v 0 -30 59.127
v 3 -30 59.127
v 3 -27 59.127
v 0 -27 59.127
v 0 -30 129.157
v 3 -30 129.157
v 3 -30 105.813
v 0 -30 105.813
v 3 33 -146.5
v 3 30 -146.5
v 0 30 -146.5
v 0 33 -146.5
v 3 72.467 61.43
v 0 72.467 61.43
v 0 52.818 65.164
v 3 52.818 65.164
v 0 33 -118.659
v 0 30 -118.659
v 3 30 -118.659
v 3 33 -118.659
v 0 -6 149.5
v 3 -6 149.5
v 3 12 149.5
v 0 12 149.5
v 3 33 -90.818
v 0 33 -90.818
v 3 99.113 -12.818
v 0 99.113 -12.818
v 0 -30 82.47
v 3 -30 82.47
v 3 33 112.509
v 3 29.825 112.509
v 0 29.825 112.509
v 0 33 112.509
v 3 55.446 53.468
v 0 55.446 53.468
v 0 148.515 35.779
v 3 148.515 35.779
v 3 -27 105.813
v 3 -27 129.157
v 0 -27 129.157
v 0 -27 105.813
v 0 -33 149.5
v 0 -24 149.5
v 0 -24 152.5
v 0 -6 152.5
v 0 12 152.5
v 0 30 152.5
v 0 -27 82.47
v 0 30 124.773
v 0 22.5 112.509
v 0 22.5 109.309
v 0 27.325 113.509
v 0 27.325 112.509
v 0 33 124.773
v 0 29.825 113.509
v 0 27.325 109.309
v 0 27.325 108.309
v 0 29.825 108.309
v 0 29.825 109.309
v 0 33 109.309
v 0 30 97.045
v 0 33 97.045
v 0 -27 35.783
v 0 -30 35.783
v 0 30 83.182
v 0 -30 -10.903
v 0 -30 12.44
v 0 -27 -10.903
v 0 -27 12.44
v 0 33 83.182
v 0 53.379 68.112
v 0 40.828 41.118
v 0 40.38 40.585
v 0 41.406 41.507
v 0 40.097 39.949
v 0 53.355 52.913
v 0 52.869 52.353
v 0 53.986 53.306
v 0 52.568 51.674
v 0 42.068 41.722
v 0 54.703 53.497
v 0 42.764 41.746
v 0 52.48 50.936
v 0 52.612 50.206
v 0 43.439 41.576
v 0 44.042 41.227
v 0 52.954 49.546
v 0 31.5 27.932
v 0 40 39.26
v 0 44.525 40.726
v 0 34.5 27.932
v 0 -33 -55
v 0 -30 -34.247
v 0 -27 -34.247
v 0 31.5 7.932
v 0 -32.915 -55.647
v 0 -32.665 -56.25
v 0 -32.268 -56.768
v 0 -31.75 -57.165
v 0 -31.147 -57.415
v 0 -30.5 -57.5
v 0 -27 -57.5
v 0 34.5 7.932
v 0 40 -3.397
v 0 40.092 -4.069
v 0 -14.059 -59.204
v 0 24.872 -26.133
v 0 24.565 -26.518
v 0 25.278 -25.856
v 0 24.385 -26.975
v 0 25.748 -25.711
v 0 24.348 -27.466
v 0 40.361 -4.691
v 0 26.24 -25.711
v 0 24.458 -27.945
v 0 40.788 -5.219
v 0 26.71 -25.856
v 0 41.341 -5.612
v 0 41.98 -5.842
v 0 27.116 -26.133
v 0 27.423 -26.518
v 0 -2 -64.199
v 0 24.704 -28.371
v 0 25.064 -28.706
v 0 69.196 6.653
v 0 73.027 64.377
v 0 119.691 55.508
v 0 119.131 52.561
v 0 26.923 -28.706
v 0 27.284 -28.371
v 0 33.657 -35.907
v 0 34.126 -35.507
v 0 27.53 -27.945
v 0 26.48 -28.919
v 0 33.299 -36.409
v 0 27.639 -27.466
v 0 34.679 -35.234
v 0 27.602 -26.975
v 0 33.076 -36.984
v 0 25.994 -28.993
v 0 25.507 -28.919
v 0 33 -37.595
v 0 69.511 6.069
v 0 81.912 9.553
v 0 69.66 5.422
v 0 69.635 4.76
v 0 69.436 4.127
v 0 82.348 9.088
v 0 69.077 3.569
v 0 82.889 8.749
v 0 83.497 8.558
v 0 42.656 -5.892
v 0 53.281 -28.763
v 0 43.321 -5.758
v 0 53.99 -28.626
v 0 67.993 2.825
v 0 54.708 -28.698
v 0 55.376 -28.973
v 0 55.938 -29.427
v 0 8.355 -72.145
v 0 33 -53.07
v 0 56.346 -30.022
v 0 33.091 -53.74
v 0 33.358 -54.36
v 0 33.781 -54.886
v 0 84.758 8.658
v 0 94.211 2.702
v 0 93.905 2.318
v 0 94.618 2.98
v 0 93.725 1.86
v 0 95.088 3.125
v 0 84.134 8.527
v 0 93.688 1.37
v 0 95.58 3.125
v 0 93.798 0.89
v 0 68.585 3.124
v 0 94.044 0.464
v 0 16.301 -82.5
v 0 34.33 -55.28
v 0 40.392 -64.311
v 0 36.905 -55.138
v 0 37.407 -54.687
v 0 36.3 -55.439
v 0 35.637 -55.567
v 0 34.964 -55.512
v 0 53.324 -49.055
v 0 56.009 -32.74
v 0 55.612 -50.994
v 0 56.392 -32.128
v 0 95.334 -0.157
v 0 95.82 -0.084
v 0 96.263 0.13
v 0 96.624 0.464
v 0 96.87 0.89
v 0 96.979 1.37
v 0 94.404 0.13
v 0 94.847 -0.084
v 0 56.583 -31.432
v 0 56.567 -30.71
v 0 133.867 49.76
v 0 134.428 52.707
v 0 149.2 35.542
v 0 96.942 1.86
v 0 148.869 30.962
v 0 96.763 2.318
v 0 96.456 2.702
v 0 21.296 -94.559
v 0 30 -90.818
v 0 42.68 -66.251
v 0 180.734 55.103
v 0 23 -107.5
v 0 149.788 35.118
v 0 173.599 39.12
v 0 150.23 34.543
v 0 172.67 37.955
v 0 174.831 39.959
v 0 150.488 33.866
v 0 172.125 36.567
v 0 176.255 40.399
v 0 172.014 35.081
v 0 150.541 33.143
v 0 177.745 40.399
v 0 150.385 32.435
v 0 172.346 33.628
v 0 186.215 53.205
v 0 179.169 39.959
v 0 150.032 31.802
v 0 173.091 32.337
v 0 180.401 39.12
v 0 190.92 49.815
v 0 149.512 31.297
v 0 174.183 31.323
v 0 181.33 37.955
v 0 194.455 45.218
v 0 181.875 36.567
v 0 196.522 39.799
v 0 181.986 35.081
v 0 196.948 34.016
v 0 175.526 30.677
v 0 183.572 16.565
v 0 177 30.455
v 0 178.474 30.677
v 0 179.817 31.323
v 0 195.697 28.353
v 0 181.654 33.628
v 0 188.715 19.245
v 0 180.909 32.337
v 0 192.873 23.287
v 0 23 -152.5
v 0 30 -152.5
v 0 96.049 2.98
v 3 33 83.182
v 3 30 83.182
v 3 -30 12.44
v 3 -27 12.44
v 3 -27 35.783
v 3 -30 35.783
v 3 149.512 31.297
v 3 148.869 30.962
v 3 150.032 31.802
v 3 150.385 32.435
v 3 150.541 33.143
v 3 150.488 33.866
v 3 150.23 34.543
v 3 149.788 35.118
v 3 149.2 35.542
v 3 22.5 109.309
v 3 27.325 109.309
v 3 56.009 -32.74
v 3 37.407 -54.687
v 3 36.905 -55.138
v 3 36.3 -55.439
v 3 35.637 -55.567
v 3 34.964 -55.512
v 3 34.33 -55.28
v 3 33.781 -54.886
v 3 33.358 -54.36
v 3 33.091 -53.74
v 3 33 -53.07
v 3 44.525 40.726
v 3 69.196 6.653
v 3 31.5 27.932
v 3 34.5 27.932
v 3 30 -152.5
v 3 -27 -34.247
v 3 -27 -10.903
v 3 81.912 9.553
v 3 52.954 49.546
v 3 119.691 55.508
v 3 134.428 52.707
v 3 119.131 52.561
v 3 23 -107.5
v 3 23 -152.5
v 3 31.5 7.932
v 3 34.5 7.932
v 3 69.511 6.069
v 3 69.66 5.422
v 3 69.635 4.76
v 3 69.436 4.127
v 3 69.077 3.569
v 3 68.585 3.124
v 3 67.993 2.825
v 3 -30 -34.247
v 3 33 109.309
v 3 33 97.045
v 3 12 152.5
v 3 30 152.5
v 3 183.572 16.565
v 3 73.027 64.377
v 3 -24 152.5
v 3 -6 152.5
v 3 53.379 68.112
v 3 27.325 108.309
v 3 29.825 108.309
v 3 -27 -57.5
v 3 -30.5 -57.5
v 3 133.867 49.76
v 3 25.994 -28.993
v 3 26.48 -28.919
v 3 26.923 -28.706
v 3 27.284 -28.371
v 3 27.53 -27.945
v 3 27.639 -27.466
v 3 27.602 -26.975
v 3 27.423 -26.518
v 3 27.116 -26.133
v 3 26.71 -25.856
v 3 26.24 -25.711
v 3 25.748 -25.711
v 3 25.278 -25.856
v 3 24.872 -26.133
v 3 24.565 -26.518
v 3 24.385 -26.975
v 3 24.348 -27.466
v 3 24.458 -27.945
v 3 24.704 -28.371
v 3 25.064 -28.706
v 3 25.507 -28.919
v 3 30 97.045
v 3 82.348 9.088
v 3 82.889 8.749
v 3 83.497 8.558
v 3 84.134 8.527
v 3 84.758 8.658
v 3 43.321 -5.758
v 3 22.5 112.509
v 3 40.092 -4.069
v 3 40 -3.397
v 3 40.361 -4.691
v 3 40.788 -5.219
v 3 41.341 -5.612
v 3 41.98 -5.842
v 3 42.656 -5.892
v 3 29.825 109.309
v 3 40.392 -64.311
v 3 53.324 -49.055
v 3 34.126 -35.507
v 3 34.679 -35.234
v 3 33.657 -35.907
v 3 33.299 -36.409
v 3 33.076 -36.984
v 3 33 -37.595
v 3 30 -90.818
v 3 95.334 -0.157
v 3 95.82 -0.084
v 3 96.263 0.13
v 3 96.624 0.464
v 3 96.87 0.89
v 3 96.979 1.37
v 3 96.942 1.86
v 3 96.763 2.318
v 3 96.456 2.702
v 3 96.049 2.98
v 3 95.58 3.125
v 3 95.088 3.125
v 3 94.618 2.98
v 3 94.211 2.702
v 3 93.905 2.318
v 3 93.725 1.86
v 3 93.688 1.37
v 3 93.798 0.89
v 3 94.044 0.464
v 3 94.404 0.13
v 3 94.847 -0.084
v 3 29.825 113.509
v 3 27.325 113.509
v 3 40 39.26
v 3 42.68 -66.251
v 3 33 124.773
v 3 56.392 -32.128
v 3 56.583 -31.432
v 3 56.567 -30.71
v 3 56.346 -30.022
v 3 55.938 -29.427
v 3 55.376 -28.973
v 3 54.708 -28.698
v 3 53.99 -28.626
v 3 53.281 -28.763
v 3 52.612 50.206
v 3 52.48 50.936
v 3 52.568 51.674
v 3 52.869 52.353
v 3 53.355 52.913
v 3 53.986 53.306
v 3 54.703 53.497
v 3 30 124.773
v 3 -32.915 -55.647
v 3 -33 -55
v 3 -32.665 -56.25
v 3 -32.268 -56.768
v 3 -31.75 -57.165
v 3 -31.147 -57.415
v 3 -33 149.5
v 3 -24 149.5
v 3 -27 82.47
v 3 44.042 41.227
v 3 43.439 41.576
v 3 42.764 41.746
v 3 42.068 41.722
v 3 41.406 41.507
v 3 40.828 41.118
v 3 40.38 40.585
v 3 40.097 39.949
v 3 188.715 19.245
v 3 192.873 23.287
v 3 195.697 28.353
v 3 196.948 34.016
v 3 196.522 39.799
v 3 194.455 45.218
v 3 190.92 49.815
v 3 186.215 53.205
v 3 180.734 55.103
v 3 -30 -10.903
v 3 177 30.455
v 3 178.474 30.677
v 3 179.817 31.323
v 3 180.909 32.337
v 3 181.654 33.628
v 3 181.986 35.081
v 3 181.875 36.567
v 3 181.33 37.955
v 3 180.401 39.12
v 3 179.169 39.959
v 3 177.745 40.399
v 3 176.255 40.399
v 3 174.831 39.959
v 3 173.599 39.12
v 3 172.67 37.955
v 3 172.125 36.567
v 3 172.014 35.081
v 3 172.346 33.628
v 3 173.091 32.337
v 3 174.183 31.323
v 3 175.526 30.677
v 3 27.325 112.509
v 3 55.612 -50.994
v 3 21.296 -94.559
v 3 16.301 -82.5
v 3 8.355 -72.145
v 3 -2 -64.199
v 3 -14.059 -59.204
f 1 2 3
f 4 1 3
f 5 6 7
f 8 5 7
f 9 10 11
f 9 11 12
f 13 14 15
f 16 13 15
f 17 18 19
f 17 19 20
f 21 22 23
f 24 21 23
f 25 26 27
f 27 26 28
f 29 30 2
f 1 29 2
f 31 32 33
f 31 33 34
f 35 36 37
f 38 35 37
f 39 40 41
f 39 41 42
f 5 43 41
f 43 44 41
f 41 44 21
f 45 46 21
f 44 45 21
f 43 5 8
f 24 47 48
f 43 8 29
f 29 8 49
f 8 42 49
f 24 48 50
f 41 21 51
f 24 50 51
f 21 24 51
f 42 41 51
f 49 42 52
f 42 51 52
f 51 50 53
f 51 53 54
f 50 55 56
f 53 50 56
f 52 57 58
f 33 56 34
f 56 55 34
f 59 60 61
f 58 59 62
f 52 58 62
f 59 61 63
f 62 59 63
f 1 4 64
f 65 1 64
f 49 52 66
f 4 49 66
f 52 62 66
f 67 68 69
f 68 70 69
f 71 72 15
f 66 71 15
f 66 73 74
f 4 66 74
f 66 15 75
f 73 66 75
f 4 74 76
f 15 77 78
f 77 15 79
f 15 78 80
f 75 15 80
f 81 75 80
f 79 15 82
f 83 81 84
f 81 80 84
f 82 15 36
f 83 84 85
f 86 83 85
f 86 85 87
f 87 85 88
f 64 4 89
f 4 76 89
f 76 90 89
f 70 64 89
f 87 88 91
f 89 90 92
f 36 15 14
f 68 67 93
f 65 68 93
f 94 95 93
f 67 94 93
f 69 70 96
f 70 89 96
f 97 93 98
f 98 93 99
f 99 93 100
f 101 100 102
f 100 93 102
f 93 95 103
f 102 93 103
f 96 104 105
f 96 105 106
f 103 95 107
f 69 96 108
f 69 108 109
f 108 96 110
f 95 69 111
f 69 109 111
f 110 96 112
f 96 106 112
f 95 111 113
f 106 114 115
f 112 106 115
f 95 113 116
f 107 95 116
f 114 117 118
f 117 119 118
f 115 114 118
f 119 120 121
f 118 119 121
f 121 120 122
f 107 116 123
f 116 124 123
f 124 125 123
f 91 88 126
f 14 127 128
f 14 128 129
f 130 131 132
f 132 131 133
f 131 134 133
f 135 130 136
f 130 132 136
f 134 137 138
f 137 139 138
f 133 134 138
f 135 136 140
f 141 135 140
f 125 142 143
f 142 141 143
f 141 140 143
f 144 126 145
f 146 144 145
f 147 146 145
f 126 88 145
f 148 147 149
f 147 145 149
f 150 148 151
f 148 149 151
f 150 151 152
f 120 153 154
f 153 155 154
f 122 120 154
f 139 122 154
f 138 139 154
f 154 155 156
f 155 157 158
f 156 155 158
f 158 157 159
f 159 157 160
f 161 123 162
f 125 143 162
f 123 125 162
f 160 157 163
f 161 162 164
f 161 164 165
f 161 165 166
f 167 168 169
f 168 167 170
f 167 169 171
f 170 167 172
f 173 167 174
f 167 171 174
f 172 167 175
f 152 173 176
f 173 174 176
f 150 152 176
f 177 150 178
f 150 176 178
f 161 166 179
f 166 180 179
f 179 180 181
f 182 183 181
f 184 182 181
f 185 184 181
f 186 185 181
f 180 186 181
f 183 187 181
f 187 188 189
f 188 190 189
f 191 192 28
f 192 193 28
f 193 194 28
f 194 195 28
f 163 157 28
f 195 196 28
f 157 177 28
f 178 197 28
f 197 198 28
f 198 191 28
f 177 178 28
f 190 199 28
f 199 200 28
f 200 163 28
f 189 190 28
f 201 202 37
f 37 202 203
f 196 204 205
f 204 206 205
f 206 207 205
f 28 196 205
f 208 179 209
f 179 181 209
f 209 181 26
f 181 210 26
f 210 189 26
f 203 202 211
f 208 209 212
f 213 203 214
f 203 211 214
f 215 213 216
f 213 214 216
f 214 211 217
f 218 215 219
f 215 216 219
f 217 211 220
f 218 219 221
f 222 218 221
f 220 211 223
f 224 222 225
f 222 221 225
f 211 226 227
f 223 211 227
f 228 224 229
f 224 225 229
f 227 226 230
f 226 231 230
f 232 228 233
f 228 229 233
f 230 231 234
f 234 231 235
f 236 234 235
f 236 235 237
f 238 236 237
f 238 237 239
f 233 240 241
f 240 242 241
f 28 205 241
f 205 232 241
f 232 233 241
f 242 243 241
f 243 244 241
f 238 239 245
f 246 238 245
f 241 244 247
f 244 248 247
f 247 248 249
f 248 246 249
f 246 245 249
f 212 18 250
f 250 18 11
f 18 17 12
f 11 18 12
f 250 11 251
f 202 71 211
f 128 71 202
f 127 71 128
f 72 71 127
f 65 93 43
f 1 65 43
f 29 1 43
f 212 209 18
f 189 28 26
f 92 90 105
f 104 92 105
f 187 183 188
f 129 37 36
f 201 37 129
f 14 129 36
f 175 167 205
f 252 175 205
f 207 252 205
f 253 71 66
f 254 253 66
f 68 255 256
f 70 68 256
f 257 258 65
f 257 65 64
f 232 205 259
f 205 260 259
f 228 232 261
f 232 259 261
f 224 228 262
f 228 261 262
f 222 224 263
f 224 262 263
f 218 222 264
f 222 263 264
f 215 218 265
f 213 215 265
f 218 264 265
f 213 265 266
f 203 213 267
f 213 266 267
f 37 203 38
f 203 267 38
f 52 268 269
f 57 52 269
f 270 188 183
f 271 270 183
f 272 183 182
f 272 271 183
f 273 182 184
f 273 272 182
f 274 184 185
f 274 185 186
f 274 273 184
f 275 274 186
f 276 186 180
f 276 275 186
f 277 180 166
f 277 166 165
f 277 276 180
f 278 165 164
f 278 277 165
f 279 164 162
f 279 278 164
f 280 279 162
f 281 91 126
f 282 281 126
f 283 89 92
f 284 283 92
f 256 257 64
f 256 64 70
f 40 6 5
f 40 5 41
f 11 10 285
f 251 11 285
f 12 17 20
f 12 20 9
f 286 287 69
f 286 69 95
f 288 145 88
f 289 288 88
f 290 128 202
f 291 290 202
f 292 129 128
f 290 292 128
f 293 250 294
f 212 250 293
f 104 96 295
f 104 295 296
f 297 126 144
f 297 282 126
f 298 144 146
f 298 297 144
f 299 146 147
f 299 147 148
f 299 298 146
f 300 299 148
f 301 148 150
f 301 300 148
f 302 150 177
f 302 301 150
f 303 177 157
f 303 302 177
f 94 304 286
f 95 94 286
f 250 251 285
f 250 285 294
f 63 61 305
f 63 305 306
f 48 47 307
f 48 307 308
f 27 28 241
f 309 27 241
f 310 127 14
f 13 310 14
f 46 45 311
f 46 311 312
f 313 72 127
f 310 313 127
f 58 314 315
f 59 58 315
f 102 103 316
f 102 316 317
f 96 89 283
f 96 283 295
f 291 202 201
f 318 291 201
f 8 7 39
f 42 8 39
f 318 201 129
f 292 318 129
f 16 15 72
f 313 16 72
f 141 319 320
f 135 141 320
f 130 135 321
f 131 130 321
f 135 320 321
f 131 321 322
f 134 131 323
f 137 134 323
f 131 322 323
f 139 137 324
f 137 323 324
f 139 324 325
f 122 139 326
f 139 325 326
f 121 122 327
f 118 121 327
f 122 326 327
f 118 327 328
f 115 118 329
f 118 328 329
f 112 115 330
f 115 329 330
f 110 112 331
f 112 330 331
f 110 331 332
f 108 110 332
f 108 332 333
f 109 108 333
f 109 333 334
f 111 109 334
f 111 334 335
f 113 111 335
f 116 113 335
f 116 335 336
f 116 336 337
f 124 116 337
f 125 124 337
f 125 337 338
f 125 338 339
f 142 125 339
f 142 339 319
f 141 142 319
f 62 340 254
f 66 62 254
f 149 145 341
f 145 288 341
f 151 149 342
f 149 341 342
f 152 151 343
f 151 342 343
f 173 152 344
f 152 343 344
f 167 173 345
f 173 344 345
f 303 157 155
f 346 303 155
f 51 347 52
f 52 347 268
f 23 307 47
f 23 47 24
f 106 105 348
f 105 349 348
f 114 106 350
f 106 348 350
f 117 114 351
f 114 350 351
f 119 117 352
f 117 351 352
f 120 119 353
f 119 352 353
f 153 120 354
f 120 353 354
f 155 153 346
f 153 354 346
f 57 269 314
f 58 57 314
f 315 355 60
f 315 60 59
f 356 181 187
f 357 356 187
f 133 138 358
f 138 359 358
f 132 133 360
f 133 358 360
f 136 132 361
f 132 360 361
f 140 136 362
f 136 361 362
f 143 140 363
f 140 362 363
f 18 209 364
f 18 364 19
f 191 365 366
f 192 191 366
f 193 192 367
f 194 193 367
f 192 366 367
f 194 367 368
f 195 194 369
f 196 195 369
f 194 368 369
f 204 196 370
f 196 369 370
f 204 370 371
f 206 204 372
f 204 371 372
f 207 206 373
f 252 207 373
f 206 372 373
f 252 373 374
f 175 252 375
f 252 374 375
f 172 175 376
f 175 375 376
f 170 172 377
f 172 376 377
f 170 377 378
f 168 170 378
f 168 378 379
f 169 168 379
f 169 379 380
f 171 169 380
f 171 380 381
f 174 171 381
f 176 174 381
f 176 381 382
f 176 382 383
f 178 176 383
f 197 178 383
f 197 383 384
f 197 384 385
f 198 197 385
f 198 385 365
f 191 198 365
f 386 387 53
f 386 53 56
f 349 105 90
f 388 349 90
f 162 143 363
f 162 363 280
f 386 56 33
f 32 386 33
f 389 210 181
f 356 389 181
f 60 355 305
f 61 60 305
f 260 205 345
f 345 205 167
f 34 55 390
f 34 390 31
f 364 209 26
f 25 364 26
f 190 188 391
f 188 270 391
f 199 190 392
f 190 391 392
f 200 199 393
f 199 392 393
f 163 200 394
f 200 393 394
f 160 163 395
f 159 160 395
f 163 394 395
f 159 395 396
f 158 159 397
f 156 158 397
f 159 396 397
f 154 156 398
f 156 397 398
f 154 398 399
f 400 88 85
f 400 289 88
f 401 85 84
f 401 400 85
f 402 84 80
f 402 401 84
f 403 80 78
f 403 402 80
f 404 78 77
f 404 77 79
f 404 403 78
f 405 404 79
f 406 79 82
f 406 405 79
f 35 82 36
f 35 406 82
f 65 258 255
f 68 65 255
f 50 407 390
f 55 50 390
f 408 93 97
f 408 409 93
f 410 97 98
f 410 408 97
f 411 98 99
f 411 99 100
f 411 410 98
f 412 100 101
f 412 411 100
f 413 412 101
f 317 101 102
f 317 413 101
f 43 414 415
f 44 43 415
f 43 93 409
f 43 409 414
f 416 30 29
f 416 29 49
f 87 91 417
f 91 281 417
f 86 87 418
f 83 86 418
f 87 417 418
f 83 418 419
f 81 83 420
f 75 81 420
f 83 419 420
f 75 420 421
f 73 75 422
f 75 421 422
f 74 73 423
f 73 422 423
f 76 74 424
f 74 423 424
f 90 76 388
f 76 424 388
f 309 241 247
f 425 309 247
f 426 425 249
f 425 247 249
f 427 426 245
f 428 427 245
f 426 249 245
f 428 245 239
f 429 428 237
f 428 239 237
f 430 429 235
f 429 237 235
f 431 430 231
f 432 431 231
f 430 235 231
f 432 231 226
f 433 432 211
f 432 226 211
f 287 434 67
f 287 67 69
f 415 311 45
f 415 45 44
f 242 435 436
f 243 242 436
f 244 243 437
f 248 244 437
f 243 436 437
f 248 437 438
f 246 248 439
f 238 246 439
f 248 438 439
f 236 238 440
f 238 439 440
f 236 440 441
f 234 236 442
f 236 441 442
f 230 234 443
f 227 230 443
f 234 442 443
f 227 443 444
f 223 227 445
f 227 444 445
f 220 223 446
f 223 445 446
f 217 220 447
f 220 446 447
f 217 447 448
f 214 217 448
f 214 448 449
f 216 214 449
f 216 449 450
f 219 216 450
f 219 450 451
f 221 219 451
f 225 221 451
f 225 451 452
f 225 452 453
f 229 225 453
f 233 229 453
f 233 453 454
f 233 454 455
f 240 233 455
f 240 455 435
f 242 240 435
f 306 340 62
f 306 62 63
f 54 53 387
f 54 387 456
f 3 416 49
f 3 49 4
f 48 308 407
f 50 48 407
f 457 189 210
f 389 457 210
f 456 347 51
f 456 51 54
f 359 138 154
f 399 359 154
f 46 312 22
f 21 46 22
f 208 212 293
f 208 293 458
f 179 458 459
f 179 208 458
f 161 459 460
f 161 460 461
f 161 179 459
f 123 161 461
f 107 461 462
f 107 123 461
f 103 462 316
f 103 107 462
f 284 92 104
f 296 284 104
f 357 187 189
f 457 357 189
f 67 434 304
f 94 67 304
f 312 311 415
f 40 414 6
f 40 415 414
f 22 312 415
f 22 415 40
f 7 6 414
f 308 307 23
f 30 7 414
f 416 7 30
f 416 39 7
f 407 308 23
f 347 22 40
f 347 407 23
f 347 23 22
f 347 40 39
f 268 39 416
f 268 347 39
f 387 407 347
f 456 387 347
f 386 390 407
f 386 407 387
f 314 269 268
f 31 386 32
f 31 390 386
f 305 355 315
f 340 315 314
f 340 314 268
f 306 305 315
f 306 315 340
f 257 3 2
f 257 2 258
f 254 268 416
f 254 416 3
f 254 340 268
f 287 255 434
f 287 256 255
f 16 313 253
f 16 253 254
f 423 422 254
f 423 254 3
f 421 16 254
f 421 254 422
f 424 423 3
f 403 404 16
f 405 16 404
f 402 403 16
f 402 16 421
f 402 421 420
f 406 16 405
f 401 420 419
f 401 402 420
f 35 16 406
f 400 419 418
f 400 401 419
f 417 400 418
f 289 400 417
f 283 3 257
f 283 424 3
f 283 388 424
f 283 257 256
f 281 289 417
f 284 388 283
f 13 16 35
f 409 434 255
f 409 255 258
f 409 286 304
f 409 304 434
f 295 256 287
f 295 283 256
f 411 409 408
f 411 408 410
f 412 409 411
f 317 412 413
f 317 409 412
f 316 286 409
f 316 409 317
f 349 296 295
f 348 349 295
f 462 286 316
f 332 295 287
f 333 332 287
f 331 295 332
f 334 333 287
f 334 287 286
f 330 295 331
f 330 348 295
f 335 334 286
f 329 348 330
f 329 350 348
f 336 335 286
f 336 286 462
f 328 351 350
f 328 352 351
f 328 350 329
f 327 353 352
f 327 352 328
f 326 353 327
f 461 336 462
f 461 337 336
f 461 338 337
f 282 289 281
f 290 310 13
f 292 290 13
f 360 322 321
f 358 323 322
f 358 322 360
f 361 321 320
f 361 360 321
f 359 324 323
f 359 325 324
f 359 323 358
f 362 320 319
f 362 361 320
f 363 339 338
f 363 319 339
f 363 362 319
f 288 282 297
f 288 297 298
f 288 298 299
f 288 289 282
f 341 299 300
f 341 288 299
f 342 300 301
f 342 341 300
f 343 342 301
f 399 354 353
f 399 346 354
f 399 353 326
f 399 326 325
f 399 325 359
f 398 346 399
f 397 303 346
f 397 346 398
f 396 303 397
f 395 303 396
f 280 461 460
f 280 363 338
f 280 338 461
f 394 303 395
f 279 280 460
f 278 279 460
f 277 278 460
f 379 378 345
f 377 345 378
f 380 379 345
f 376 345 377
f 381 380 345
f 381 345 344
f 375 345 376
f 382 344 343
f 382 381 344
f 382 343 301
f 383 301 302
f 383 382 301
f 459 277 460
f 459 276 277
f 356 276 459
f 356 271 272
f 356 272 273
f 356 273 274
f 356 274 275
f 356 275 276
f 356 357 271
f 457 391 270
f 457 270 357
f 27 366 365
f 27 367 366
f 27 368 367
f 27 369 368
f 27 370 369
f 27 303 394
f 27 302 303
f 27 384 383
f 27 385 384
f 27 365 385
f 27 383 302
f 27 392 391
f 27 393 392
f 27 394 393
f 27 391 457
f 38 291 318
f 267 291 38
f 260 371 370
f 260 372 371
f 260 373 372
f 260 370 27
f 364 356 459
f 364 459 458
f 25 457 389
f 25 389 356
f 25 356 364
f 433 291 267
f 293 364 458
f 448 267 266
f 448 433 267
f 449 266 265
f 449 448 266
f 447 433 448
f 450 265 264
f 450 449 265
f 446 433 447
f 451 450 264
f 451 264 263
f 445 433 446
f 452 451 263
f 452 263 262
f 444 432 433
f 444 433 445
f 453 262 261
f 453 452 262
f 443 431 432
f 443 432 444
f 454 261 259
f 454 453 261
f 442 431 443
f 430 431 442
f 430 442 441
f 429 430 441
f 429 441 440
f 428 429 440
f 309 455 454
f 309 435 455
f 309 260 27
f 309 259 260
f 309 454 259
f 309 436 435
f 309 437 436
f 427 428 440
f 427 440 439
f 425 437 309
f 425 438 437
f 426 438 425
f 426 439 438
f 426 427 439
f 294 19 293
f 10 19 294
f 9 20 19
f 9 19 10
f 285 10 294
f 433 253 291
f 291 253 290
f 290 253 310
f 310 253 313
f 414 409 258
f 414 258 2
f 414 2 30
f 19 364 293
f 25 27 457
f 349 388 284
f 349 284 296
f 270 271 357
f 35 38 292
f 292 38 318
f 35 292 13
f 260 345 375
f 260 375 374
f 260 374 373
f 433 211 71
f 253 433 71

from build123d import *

# Parameters (mm, degrees)
BOSS_EXTRUDE1_DEPTH     = 3
SKETCH2_W               = 27.727272727
SKETCH2_H               = 3
SKETCH2_W_2             = 3
SKETCH2_H_2             = 18
SKETCH2_H_3             = 9
SKETCH2_W_3             = 23.343342349
SKETCH2_W_4             = 23.34334235
SKETCH2_W_5             = 6
CUT_EXTRUDE1_DEPTH      = 1
CUT_EXTRUDE1_DEPTH_BACK = 4
SKETCH3_W               = 3.2
SKETCH3_H               = 10.5
SKETCH3_W_2             = 5.2
SKETCH3_H_2             = 2.5
CUT_EXTRUDE2_DEPTH      = 1
CUT_EXTRUDE2_DEPTH_BACK = 4
FILLET1_R               = 2.5
BOSS_EXTRUDE2_DEPTH     = 3
FILLET2_R               = 2.5
SKETCH6_R               = 5
SKETCH6_R_2             = 1.65
CUT_EXTRUDE5_DEPTH      = 1
CUT_EXTRUDE5_DEPTH_BACK = 4
SKETCH8_R               = 10
SKETCH8_W               = 5
SKETCH8_H               = 1
CUT_EXTRUDE6_DEPTH      = 4
CUT_EXTRUDE6_DEPTH_BACK = 1
SKETCH8_4_R             = 10
SKETCH8_4_W             = 5
SKETCH8_4_H             = 1
BOSS_EXTRUDE4_DEPTH     = 3
SKETCH9_W               = 20
SKETCH9_H               = 3
CUT_EXTRUDE7_DEPTH      = 4
CUT_EXTRUDE7_DEPTH_BACK = 1
SKETCH10_W              = 27.840909091
SKETCH10_H              = 3
CUT_EXTRUDE8_DEPTH      = 4
CUT_EXTRUDE8_DEPTH_BACK = 1


with BuildPart() as part:
    # Sketch1 → Boss-Extrude1 (new body)
    with BuildSketch(Plane(origin=(0, 0, 0), x_dir=(0, 0, -1), z_dir=(1, 0, 0))):
        with BuildLine():
            Line((-152.5, 33), (152.5, 33))
            Line((152.5, 33), (152.5, 23))
            Line((152.5, 23), (107.5, 23))
            ThreePointArc((107.5, 23), (72.144660941, 8.355339059), (57.5, -27))
            Line((57.5, -27), (57.5, -33))
            Line((57.5, -33), (-152.5, -33))
            Line((-152.5, -33), (-152.5, 33))
        make_face()
    extrude(amount=BOSS_EXTRUDE1_DEPTH)

    # Sketch2 → Cut-Extrude1 (cut, two sides)
    with BuildSketch(Plane(origin=(3, 0, 0), x_dir=(0, 0, -1), z_dir=(1, 0, 0))) as cut_extrude1_sk:
        with Locations((-138.636363636, 31.5)):
            Rectangle(SKETCH2_W, SKETCH2_H)
        with Locations((-83.181818182, 31.5)):
            Rectangle(SKETCH2_W, SKETCH2_H)
        with Locations((-27.727272728, 31.5)):
            Rectangle(SKETCH2_W, SKETCH2_H)
        with Locations((-151, 3)):
            Rectangle(SKETCH2_W_2, SKETCH2_H_2)
        with Locations((-151, -28.5)):
            Rectangle(SKETCH2_W_2, SKETCH2_H_3)
        with Locations((-117.484986475, -28.5)):
            Rectangle(SKETCH2_W_3, SKETCH2_H)
        with Locations((-70.798301777, -28.5)):
            Rectangle(SKETCH2_W_3, SKETCH2_H)
        with Locations((22.575067622, -28.5)):
            Rectangle(SKETCH2_W_4, SKETCH2_H)
        with Locations((149.5, 31.5)):
            Rectangle(SKETCH2_W_5, SKETCH2_H)
        with Locations((-24.111617078, -28.5)):
            Rectangle(SKETCH2_W_3, SKETCH2_H)
    extrude(amount=CUT_EXTRUDE1_DEPTH, mode=Mode.SUBTRACT)
    extrude(cut_extrude1_sk.sketch, amount=-CUT_EXTRUDE1_DEPTH_BACK, mode=Mode.SUBTRACT)

    # Sketch3 → Cut-Extrude2 (cut, two sides)
    with BuildSketch(Plane(origin=(3, 0, 0), x_dir=(0, 0, -1), z_dir=(1, 0, 0))) as cut_extrude2_sk:
        with Locations((-110.909090909, 27.75)):
            Rectangle(SKETCH3_W, SKETCH3_H)
        with Locations((-110.909090909, 28.575)):
            Rectangle(SKETCH3_W_2, SKETCH3_H_2)
    extrude(amount=CUT_EXTRUDE2_DEPTH, mode=Mode.SUBTRACT)
    extrude(cut_extrude2_sk.sketch, amount=-CUT_EXTRUDE2_DEPTH_BACK, mode=Mode.SUBTRACT)

    # Fillet1
    fillet1_edges = [part.edges().sort_by_distance(p)[0] for p in [
        (1.5, -33, -57.5),
    ]]
    fillet(fillet1_edges, radius=FILLET1_R)

    # Sketch4 → Boss-Extrude2 (add)
    with BuildSketch(Plane(origin=(0, 0, 0), x_dir=(0, 0, -1), z_dir=(1, 0, 0))):
        with BuildLine():
            Line((-83.181818182, 33), (-83.181818182, 30))
            Line((-83.181818182, 30), (35.818181818, 30))
            Line((35.818181818, 30), (35.818181818, 33))
            Line((35.818181818, 33), (25.753026775, 61.931534749))
            Line((25.753026775, 61.931534749), (59.886459158, 33))
            Line((59.886459158, 33), (90.818181818, 33))
            Line((90.818181818, 33), (12.817635516, 99.113348651))
            Line((12.817635516, 99.113348651), (-16.565017269, 183.571584658))
            ThreePointArc((-16.565017269, 183.571584658), (-36.922973482, 196.946020133), (-55.102803407, 180.73442893))
            Line((-55.102803407, 180.73442893), (-83.181818182, 33))
        make_face()
        Polygon((-54.643252411, 49.263022537), (-34.033564648, 157.698467174), (-8.047004759, 83.002045982), align=None, mode=Mode.SUBTRACT)
        Polygon((-3.929894771, 71.167721507), (6.913219914, 40), (-46.974972009, 40), align=None, mode=Mode.SUBTRACT)
    extrude(amount=BOSS_EXTRUDE2_DEPTH)

    # Fillet2
    fillet2_edges = [part.edges().sort_by_distance(p)[0] for p in [
        (1.5, 33, -59.886459158),
        (1.5, 61.931534749, -25.753026775),
        (1.5, 33, -35.818181818),
        (1.5, 40, -6.913219914),
        (1.5, 71.167721507, 3.929894771),
        (1.5, 40, 46.974972009),
        (1.5, 49.263022537, 54.643252411),
        (1.5, 83.002045982, 8.047004759),
        (1.5, 157.698467174, 34.033564648),
    ]]
    fillet(fillet2_edges, radius=FILLET2_R)

    # Sketch6 → Cut-Extrude5 (cut, two sides)
    with BuildSketch(Plane(origin=(3, 0, 0), x_dir=(0, 0, -1), z_dir=(1, 0, 0))) as cut_extrude5_sk:
        with Locations((-35.454545455, 177)):
            Circle(SKETCH6_R)
        with Locations((-1.492946709, 95.333591431)):
            Circle(SKETCH6_R_2)
        with Locations((27.342535354, 25.993797473)):
            Circle(SKETCH6_R_2)
    extrude(amount=CUT_EXTRUDE5_DEPTH, mode=Mode.SUBTRACT)
    extrude(cut_extrude5_sk.sketch, amount=-CUT_EXTRUDE5_DEPTH_BACK, mode=Mode.SUBTRACT)

    # Sketch8 → Cut-Extrude6 (cut, two sides)
    with BuildSketch(Plane(origin=(0, 0, 0), x_dir=(0, 0, -1), z_dir=(1, 0, 0))) as cut_extrude6_sk:
        with Locations((-40, 0)):
            Circle(SKETCH8_R)
        with Locations((-5, 0)):
            Rectangle(SKETCH8_W, SKETCH8_H)
    extrude(amount=CUT_EXTRUDE6_DEPTH, mode=Mode.SUBTRACT)
    extrude(cut_extrude6_sk.sketch, amount=-CUT_EXTRUDE6_DEPTH_BACK, mode=Mode.SUBTRACT)

    # Sketch8_4 → Boss-Extrude4 (add)
    with BuildSketch(Plane(origin=(0, 0, 0), x_dir=(0, 0, -1), z_dir=(1, 0, 0))):
        with Locations((-40, 0)):
            Circle(SKETCH8_4_R)
        with Locations((-5, 0)):
            Rectangle(SKETCH8_4_W, SKETCH8_4_H)
    extrude(amount=BOSS_EXTRUDE4_DEPTH)

    # Sketch9 → Cut-Extrude7 (cut, two sides)
    with BuildSketch(Plane(origin=(0, 0, 0), x_dir=(0, 0, -1), z_dir=(1, 0, 0))) as cut_extrude7_sk:
        Polygon((-68.111670983, 53.378521315), (-64.377242053, 73.026779267), (-61.43000336, 72.466614928), (-65.16443229, 52.818356975), align=None)
        Polygon((-55.507973344, 119.691391905), (-52.707151647, 134.427585369), (-49.759912954, 133.867421029), (-52.560734651, 119.131227565), align=None)
        Polygon((64.311409407, 40.391956194), (49.054577079, 53.32366402), (50.994333253, 55.612188869), (66.251165581, 42.680481043), align=None)
        with Locations((-17.931502251, 33)):
            Rectangle(SKETCH9_W, SKETCH9_H)
    extrude(amount=CUT_EXTRUDE7_DEPTH, mode=Mode.SUBTRACT)
    extrude(cut_extrude7_sk.sketch, amount=-CUT_EXTRUDE7_DEPTH_BACK, mode=Mode.SUBTRACT)

    # Sketch10 → Cut-Extrude8 (cut, two sides)
    with BuildSketch(Plane(origin=(0, 0, 0), x_dir=(0, 0, -1), z_dir=(1, 0, 0))) as cut_extrude8_sk:
        with Locations((104.738636364, 31.5)):
            Rectangle(SKETCH10_W, SKETCH10_H)
    extrude(amount=CUT_EXTRUDE8_DEPTH, mode=Mode.SUBTRACT)
    extrude(cut_extrude8_sk.sketch, amount=-CUT_EXTRUDE8_DEPTH_BACK, mode=Mode.SUBTRACT)


solid = part.part
